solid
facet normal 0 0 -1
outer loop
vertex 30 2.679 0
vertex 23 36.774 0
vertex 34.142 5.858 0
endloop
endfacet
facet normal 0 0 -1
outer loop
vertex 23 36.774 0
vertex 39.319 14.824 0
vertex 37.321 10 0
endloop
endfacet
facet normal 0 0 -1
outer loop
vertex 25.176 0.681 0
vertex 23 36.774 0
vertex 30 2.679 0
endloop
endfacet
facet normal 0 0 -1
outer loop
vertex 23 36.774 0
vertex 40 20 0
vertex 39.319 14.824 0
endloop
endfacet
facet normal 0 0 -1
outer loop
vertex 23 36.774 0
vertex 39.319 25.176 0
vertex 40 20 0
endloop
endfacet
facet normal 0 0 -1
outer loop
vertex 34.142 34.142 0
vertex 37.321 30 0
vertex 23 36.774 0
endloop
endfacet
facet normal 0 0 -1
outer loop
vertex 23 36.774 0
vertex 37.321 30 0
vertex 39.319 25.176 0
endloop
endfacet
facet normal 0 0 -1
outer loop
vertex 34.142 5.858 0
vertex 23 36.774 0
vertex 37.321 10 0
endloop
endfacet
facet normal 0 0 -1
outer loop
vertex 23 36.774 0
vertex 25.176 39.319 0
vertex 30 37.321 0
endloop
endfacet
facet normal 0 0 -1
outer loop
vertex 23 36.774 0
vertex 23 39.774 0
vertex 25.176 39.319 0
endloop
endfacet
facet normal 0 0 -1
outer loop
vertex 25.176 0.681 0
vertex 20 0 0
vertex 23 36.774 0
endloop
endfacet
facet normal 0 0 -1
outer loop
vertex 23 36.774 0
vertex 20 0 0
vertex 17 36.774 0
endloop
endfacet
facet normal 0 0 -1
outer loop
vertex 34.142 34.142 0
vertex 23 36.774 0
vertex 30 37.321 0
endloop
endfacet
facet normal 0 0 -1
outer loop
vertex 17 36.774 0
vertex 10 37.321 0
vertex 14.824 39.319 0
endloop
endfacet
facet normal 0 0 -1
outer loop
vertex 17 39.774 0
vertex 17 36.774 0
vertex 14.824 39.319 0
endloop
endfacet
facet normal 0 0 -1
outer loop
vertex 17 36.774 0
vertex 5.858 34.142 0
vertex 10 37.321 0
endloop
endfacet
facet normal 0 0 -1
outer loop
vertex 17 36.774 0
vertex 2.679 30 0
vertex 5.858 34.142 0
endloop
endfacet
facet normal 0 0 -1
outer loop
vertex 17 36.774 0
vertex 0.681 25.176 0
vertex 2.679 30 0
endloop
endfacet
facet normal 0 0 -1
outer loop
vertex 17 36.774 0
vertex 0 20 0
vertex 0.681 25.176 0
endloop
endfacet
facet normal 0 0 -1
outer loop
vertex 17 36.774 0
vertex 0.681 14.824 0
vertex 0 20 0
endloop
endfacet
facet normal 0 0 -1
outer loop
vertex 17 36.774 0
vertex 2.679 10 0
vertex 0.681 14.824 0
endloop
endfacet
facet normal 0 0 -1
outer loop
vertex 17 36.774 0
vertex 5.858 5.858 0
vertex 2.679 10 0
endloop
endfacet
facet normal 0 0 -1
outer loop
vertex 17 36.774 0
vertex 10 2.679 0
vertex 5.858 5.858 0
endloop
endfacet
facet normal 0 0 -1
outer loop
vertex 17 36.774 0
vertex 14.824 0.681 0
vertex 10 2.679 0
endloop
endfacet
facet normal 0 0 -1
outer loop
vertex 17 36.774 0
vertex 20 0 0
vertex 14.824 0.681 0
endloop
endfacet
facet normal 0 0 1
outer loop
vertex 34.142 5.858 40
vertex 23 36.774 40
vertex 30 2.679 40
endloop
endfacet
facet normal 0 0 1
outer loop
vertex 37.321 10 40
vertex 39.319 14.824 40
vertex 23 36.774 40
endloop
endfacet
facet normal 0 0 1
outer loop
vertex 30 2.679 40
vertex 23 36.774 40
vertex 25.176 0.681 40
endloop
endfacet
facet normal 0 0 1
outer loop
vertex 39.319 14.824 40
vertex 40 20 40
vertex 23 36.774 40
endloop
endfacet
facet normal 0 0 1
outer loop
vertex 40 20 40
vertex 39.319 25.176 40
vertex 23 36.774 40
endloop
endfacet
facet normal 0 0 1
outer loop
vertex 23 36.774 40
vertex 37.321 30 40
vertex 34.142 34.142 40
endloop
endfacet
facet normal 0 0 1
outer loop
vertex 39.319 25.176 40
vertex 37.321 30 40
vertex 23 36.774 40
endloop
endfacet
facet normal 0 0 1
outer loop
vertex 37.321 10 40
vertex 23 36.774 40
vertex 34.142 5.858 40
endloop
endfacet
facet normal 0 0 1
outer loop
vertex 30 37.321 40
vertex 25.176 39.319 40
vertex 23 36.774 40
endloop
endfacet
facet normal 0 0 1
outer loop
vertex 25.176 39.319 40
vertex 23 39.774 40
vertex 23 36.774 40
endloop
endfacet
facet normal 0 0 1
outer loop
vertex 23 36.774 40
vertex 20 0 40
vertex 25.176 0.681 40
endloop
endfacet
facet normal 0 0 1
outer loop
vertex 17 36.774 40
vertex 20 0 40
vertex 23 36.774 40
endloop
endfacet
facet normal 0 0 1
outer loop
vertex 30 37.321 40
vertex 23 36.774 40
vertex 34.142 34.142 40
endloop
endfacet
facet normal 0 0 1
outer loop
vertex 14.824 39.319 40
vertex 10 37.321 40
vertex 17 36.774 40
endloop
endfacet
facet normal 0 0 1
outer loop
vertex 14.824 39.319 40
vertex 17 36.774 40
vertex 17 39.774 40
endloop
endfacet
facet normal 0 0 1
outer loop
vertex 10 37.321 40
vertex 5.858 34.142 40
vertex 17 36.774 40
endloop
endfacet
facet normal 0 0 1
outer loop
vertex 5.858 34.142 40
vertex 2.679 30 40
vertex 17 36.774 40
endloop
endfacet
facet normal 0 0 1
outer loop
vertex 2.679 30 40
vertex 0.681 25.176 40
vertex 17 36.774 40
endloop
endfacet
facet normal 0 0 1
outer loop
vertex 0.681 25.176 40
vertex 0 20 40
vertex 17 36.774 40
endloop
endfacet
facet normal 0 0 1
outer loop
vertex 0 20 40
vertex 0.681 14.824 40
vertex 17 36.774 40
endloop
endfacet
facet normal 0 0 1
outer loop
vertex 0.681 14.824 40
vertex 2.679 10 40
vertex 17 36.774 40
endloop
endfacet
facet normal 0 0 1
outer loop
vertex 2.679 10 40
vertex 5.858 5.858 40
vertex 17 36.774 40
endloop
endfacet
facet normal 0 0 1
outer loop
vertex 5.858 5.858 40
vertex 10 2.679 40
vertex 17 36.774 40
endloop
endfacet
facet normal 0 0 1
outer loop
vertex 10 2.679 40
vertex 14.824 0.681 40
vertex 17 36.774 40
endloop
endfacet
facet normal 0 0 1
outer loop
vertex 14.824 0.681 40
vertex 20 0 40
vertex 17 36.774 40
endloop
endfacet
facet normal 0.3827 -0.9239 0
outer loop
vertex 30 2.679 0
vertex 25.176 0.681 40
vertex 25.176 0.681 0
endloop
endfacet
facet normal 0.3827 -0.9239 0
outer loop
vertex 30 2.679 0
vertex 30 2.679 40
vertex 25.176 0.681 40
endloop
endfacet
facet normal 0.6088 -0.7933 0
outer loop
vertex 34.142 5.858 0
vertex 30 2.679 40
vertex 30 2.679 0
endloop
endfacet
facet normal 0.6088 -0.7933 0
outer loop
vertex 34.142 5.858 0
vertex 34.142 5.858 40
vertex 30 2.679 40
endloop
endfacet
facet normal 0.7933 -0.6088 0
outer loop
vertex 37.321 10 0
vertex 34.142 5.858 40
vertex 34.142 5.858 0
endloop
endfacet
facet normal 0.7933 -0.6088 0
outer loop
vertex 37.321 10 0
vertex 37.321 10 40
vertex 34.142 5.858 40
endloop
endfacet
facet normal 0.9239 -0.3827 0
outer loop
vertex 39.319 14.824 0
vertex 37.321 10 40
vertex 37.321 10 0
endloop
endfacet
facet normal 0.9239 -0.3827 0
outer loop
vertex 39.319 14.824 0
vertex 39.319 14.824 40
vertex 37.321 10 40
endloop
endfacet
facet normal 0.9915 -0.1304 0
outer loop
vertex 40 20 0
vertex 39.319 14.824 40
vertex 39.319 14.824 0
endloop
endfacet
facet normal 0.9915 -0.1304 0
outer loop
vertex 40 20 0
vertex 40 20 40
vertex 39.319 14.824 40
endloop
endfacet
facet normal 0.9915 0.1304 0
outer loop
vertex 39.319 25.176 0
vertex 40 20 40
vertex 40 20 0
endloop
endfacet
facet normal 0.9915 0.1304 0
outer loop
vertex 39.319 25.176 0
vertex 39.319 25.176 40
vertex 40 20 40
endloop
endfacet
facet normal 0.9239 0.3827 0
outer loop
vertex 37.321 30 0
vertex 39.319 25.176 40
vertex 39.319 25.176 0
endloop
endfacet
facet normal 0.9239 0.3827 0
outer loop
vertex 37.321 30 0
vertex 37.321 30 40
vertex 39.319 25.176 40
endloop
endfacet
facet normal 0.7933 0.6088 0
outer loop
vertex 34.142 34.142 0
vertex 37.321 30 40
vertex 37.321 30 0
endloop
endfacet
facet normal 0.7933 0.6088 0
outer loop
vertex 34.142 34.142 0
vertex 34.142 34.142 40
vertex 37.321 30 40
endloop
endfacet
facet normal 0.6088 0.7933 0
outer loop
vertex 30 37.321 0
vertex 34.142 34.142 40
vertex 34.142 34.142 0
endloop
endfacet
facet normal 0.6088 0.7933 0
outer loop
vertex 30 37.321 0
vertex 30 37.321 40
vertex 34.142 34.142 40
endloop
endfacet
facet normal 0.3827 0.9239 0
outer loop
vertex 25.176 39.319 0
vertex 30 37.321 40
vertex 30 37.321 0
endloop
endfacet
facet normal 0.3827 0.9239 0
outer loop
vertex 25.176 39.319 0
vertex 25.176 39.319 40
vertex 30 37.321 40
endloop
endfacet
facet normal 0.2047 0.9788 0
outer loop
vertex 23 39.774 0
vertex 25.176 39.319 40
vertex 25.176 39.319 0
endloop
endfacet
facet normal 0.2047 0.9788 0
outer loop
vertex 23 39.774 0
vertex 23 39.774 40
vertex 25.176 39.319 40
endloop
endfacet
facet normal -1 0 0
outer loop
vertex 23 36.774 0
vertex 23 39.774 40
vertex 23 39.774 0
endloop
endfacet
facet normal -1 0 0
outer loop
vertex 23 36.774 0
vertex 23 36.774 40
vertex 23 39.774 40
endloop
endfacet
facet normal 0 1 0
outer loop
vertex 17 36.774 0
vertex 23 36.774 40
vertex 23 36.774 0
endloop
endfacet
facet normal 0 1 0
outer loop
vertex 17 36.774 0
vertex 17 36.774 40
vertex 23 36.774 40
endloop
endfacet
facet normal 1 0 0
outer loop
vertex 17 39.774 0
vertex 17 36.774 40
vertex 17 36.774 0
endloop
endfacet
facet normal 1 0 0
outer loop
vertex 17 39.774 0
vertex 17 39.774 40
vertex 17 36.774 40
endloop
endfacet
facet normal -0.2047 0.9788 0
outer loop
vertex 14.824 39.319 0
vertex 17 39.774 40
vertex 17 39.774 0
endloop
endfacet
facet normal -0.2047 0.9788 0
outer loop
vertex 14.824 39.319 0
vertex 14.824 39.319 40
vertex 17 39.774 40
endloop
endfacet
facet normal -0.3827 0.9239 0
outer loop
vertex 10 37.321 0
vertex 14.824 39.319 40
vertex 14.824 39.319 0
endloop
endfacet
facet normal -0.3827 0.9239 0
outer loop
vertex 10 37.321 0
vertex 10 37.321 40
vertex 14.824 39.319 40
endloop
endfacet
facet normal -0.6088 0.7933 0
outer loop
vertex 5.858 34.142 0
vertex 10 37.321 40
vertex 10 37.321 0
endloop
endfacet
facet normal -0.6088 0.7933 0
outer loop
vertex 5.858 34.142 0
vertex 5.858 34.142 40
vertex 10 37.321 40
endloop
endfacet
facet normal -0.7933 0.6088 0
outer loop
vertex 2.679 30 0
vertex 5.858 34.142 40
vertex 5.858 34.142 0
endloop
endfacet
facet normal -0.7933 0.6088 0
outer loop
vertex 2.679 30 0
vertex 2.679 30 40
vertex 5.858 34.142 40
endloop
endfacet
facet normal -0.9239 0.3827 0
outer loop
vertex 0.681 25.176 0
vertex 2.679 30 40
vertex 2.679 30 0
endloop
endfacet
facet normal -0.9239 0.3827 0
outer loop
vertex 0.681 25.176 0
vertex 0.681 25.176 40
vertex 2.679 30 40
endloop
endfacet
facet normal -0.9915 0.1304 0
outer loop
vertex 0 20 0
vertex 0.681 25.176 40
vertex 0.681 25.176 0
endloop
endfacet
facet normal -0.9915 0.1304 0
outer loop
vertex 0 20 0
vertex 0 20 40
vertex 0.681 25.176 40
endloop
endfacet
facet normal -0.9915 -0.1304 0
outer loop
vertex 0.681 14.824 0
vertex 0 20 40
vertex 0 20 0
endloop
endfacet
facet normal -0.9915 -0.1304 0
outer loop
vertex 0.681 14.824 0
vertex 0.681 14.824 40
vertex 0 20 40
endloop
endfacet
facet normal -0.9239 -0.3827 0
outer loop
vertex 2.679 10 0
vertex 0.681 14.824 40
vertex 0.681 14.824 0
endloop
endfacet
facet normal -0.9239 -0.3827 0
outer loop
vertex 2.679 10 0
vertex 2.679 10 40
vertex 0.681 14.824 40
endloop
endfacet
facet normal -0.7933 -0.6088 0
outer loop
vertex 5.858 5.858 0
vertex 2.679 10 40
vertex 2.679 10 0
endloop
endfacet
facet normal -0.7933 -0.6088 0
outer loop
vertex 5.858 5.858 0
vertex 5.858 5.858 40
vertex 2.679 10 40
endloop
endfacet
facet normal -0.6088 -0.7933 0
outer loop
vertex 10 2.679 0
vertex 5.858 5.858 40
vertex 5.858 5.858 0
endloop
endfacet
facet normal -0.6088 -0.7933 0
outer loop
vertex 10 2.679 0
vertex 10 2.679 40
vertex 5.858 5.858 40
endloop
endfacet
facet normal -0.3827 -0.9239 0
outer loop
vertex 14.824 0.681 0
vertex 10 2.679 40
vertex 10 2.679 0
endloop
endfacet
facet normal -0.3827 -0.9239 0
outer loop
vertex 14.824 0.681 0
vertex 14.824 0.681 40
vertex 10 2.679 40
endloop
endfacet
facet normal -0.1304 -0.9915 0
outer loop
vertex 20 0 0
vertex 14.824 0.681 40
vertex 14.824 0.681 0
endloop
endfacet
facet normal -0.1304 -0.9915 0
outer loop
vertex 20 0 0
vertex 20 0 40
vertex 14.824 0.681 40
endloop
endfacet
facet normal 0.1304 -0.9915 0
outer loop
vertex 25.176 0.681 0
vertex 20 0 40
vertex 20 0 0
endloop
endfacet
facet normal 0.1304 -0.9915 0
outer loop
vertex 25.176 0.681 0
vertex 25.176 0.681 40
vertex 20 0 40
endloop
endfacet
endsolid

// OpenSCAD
$fn = 32;

// ----------------------------------------------------------------------
// Keyway shaft: d40 shaft, key 6 x 3 mm
// ----------------------------------------------------------------------

// --- parameters (mm) ---
shaft_r = 20;             // shaft radius
key_w = 6;                // keyway width
key_d = 3;                // keyway depth below the surface line
plate_t = 40;             // shaft length, Z (extrusion height)

shaft_d = 2 * shaft_r;  // shaft diameter
circle_step = 15;  // polygon sampling step, degrees

profile = [[14.824, 39.319], [10, 37.321], [5.858, 34.142], [2.679, 30], [0.681, 25.176], [0, 20], [0.681, 14.824], [2.679, 10], [5.858, 5.858], [10, 2.679], [14.824, 0.681], [20, 0], [25.176, 0.681], [30, 2.679], [34.142, 5.858], [37.321, 10], [39.319, 14.824], [40, 20], [39.319, 25.176], [37.321, 30], [34.142, 34.142], [30, 37.321], [25.176, 39.319], [23, 39.774], [23, 36.774], [17, 36.774], [17, 39.774]];  // primary outline, 27 points, counter clockwise

// --- the one profile operation ---
linear_extrude(height = plate_t) polygon(points = profile);
